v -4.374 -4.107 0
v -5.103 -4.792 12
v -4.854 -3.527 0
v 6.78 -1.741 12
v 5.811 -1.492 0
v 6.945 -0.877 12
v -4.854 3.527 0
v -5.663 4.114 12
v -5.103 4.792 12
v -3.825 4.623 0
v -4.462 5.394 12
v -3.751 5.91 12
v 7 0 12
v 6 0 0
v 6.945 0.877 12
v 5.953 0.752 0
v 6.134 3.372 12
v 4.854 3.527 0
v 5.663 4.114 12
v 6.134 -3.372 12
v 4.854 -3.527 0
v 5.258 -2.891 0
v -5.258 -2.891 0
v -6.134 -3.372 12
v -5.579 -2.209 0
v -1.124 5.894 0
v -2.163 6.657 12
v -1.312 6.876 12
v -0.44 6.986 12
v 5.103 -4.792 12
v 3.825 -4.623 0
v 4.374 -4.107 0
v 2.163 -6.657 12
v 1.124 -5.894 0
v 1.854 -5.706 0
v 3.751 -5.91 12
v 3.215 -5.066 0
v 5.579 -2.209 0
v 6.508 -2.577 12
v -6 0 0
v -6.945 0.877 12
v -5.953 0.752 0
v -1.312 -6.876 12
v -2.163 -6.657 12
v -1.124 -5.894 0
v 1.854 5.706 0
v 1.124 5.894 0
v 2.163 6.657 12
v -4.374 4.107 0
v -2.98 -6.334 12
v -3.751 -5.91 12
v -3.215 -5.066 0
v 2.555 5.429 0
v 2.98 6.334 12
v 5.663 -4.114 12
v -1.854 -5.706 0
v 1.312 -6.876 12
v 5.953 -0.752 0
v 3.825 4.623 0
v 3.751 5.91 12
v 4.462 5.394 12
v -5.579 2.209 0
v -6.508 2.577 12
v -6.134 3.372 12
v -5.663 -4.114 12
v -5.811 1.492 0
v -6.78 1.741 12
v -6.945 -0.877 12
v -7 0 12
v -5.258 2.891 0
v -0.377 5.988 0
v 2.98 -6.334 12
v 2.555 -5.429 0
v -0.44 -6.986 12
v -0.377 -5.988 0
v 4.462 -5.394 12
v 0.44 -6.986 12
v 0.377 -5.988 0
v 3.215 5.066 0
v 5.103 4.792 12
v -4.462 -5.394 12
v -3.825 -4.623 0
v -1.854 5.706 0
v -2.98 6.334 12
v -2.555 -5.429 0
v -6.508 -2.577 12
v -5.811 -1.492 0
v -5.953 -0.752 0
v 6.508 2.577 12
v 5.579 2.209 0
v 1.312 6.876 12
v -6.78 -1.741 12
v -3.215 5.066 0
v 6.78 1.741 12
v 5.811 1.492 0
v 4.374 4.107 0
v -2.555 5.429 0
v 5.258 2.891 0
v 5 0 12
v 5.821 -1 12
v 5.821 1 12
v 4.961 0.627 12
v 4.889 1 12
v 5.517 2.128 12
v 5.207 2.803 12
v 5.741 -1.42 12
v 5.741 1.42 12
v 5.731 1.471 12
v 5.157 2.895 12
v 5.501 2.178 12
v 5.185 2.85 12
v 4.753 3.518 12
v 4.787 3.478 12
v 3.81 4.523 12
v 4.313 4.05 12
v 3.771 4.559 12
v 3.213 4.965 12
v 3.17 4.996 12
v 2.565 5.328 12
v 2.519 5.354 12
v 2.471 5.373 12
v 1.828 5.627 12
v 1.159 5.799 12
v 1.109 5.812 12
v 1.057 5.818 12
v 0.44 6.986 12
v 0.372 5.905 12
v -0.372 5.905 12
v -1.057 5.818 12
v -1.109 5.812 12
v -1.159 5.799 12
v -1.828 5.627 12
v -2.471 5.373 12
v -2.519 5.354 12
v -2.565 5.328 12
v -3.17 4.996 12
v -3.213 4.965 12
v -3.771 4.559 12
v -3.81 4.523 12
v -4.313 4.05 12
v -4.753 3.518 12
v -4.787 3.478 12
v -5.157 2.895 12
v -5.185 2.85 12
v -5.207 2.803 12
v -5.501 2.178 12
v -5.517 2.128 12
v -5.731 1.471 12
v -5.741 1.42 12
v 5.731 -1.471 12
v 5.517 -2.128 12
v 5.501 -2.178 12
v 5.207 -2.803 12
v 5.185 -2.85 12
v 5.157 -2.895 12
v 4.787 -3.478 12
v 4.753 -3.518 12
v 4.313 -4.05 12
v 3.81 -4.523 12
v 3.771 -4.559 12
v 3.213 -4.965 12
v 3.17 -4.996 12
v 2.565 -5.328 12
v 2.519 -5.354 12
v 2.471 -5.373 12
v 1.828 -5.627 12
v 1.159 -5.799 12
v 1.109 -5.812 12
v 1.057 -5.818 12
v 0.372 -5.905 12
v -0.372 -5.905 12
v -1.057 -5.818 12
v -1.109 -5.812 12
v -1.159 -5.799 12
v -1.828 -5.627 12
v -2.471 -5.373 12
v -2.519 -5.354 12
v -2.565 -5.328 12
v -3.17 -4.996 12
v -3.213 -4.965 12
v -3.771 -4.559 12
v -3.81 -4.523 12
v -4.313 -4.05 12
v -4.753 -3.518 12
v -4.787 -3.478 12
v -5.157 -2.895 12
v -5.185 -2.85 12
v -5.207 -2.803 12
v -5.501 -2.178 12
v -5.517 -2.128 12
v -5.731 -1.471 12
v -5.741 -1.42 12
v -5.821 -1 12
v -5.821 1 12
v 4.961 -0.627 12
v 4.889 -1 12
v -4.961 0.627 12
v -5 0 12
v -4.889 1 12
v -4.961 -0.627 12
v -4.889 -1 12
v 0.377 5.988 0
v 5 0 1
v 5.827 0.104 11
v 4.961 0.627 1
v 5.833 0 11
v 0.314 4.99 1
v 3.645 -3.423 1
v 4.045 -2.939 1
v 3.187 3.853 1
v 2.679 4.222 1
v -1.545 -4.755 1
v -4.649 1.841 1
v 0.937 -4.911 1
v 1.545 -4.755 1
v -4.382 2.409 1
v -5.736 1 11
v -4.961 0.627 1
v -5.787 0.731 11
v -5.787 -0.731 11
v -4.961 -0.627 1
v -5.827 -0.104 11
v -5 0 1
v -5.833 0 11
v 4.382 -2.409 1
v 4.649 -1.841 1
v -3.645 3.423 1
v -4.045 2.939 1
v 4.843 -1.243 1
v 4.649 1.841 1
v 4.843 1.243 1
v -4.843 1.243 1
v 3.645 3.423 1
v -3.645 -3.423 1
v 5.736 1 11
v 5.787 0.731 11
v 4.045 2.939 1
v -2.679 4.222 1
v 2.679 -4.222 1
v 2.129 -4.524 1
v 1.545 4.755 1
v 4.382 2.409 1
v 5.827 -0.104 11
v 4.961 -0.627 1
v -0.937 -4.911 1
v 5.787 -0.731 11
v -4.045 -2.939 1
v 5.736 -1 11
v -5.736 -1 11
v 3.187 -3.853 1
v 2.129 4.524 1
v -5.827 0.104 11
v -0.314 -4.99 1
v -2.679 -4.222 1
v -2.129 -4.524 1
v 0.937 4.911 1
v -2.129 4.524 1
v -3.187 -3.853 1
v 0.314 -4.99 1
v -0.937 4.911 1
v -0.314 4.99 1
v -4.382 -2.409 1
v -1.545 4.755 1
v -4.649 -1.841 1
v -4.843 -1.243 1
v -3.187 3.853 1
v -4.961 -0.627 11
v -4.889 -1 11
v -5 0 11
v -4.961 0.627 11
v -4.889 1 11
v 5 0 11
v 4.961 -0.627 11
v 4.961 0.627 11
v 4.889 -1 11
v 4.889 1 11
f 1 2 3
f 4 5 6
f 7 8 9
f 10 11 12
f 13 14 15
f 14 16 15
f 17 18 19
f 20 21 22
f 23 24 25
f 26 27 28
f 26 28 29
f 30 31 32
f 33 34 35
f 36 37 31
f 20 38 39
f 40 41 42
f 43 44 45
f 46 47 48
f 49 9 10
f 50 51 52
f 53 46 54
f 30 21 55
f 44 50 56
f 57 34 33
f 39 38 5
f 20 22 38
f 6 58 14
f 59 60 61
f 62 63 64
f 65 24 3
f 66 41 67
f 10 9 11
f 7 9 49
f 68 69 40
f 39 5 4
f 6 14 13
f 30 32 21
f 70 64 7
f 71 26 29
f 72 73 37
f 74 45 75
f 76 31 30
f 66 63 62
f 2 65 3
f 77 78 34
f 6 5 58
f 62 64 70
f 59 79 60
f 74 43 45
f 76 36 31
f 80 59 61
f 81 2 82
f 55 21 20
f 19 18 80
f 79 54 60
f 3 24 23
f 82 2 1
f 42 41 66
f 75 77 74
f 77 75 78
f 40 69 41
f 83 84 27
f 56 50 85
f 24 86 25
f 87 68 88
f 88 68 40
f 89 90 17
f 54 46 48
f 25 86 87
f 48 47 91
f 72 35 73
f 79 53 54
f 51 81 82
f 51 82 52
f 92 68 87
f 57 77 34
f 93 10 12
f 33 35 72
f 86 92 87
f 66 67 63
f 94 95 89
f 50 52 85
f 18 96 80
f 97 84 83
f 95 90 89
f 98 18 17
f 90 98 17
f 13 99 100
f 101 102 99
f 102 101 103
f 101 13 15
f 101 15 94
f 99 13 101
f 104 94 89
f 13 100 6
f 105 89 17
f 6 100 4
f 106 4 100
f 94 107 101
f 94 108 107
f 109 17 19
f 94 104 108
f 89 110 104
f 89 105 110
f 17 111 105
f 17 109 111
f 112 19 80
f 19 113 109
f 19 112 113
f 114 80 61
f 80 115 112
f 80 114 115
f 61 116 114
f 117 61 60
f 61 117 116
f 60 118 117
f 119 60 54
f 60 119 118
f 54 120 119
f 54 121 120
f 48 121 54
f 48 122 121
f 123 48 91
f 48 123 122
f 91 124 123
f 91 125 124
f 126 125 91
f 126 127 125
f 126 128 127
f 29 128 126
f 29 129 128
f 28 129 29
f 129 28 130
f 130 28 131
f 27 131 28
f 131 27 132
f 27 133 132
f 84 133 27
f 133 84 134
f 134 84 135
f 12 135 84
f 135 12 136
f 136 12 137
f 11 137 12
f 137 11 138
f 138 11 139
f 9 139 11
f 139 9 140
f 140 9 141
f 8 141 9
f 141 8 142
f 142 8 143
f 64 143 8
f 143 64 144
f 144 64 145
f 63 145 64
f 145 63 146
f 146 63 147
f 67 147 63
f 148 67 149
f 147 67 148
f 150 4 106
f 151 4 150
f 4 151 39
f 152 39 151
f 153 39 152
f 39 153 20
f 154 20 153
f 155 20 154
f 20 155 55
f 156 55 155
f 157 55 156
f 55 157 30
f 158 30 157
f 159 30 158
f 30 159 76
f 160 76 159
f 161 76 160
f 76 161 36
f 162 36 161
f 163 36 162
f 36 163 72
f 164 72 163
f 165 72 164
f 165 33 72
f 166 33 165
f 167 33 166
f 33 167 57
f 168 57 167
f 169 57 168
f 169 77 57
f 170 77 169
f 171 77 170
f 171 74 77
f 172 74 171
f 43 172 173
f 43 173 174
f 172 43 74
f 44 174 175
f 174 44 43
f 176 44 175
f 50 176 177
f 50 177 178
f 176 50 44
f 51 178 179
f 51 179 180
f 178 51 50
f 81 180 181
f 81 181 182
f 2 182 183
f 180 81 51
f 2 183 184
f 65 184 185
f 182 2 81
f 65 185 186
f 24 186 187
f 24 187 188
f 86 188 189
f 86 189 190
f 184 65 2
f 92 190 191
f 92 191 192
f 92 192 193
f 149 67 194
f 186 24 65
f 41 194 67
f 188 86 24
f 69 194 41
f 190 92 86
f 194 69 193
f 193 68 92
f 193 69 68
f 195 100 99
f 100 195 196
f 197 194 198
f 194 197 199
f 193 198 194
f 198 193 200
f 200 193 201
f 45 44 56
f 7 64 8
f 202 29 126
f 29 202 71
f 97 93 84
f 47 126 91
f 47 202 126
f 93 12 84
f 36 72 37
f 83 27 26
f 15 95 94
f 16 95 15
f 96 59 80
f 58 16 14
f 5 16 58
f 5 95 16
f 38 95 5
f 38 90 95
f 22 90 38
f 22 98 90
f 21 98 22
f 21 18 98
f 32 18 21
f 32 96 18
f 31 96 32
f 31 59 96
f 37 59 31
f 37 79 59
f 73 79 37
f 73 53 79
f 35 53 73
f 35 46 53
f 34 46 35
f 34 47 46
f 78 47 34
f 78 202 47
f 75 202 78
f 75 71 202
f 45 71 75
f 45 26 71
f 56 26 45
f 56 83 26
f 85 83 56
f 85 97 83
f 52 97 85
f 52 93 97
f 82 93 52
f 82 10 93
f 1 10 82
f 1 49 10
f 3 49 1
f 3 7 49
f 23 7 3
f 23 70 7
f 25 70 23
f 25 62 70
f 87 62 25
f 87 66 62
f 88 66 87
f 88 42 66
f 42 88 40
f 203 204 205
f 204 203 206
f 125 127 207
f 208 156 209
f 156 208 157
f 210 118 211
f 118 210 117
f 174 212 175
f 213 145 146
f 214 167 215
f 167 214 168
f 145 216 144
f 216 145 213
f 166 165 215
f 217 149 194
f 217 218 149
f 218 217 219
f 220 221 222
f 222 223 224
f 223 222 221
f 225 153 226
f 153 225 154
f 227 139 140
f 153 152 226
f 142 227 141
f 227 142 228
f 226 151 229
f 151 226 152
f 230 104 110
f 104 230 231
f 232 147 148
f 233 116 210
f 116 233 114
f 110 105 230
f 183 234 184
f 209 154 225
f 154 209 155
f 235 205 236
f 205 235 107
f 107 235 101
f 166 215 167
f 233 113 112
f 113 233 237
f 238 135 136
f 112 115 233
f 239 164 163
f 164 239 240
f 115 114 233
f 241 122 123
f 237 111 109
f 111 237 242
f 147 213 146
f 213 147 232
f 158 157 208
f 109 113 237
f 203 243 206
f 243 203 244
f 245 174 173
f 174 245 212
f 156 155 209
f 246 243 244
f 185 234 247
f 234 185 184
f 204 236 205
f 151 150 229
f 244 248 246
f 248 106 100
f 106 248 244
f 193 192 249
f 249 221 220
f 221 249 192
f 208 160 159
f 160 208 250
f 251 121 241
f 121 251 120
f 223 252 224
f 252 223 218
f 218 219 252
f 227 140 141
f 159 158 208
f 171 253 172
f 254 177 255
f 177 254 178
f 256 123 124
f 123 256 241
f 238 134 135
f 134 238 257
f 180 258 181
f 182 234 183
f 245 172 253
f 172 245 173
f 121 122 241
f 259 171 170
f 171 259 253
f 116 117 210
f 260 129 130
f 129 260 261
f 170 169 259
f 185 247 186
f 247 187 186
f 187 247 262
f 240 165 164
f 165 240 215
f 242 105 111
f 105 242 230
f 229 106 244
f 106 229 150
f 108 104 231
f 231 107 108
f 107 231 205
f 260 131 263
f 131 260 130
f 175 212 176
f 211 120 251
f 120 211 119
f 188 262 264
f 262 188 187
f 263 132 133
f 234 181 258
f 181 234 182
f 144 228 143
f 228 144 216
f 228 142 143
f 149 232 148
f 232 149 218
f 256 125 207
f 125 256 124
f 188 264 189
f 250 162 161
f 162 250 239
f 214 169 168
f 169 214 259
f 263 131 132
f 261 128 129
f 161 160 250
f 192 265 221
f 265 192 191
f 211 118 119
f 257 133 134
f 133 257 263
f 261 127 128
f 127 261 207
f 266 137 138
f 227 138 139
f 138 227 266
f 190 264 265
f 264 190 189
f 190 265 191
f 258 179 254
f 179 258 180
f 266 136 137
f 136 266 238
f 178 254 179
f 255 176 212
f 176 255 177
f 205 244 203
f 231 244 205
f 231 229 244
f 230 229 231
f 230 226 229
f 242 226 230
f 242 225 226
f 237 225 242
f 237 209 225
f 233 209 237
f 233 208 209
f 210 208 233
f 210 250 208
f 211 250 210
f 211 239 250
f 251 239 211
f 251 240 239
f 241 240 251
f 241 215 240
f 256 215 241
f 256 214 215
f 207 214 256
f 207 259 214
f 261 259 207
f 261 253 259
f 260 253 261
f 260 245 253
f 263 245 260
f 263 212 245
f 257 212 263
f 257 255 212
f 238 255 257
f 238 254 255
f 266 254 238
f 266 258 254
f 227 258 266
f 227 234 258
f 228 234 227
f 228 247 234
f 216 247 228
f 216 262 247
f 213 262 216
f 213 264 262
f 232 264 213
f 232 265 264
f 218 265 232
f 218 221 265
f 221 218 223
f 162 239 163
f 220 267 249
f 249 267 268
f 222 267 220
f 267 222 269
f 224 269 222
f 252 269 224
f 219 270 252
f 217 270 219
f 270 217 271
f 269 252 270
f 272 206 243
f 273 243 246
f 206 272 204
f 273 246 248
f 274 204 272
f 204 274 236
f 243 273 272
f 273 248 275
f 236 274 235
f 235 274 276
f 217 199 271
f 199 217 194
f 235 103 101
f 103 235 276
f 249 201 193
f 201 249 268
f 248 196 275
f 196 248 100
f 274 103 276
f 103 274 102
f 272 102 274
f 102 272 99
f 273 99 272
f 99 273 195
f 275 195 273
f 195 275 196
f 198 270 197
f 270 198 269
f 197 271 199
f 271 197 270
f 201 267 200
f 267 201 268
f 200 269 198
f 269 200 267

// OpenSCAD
$fn=50;

difference() {
   cylinder(r1=6,r2=7,h=12);
   translate([0,0,1]) cylinder(r1=5,r2=6,h=12);
   // translate([0,0,-1]) cylinder(r1=2,h=12);
}


difference() {
   intersection() {
      cylinder(r1=6,r2=7,h=12);
      translate([0,0,11.5]) cube([15,2,1],center=true);
   }
   cylinder(r=5,h=13);
}
